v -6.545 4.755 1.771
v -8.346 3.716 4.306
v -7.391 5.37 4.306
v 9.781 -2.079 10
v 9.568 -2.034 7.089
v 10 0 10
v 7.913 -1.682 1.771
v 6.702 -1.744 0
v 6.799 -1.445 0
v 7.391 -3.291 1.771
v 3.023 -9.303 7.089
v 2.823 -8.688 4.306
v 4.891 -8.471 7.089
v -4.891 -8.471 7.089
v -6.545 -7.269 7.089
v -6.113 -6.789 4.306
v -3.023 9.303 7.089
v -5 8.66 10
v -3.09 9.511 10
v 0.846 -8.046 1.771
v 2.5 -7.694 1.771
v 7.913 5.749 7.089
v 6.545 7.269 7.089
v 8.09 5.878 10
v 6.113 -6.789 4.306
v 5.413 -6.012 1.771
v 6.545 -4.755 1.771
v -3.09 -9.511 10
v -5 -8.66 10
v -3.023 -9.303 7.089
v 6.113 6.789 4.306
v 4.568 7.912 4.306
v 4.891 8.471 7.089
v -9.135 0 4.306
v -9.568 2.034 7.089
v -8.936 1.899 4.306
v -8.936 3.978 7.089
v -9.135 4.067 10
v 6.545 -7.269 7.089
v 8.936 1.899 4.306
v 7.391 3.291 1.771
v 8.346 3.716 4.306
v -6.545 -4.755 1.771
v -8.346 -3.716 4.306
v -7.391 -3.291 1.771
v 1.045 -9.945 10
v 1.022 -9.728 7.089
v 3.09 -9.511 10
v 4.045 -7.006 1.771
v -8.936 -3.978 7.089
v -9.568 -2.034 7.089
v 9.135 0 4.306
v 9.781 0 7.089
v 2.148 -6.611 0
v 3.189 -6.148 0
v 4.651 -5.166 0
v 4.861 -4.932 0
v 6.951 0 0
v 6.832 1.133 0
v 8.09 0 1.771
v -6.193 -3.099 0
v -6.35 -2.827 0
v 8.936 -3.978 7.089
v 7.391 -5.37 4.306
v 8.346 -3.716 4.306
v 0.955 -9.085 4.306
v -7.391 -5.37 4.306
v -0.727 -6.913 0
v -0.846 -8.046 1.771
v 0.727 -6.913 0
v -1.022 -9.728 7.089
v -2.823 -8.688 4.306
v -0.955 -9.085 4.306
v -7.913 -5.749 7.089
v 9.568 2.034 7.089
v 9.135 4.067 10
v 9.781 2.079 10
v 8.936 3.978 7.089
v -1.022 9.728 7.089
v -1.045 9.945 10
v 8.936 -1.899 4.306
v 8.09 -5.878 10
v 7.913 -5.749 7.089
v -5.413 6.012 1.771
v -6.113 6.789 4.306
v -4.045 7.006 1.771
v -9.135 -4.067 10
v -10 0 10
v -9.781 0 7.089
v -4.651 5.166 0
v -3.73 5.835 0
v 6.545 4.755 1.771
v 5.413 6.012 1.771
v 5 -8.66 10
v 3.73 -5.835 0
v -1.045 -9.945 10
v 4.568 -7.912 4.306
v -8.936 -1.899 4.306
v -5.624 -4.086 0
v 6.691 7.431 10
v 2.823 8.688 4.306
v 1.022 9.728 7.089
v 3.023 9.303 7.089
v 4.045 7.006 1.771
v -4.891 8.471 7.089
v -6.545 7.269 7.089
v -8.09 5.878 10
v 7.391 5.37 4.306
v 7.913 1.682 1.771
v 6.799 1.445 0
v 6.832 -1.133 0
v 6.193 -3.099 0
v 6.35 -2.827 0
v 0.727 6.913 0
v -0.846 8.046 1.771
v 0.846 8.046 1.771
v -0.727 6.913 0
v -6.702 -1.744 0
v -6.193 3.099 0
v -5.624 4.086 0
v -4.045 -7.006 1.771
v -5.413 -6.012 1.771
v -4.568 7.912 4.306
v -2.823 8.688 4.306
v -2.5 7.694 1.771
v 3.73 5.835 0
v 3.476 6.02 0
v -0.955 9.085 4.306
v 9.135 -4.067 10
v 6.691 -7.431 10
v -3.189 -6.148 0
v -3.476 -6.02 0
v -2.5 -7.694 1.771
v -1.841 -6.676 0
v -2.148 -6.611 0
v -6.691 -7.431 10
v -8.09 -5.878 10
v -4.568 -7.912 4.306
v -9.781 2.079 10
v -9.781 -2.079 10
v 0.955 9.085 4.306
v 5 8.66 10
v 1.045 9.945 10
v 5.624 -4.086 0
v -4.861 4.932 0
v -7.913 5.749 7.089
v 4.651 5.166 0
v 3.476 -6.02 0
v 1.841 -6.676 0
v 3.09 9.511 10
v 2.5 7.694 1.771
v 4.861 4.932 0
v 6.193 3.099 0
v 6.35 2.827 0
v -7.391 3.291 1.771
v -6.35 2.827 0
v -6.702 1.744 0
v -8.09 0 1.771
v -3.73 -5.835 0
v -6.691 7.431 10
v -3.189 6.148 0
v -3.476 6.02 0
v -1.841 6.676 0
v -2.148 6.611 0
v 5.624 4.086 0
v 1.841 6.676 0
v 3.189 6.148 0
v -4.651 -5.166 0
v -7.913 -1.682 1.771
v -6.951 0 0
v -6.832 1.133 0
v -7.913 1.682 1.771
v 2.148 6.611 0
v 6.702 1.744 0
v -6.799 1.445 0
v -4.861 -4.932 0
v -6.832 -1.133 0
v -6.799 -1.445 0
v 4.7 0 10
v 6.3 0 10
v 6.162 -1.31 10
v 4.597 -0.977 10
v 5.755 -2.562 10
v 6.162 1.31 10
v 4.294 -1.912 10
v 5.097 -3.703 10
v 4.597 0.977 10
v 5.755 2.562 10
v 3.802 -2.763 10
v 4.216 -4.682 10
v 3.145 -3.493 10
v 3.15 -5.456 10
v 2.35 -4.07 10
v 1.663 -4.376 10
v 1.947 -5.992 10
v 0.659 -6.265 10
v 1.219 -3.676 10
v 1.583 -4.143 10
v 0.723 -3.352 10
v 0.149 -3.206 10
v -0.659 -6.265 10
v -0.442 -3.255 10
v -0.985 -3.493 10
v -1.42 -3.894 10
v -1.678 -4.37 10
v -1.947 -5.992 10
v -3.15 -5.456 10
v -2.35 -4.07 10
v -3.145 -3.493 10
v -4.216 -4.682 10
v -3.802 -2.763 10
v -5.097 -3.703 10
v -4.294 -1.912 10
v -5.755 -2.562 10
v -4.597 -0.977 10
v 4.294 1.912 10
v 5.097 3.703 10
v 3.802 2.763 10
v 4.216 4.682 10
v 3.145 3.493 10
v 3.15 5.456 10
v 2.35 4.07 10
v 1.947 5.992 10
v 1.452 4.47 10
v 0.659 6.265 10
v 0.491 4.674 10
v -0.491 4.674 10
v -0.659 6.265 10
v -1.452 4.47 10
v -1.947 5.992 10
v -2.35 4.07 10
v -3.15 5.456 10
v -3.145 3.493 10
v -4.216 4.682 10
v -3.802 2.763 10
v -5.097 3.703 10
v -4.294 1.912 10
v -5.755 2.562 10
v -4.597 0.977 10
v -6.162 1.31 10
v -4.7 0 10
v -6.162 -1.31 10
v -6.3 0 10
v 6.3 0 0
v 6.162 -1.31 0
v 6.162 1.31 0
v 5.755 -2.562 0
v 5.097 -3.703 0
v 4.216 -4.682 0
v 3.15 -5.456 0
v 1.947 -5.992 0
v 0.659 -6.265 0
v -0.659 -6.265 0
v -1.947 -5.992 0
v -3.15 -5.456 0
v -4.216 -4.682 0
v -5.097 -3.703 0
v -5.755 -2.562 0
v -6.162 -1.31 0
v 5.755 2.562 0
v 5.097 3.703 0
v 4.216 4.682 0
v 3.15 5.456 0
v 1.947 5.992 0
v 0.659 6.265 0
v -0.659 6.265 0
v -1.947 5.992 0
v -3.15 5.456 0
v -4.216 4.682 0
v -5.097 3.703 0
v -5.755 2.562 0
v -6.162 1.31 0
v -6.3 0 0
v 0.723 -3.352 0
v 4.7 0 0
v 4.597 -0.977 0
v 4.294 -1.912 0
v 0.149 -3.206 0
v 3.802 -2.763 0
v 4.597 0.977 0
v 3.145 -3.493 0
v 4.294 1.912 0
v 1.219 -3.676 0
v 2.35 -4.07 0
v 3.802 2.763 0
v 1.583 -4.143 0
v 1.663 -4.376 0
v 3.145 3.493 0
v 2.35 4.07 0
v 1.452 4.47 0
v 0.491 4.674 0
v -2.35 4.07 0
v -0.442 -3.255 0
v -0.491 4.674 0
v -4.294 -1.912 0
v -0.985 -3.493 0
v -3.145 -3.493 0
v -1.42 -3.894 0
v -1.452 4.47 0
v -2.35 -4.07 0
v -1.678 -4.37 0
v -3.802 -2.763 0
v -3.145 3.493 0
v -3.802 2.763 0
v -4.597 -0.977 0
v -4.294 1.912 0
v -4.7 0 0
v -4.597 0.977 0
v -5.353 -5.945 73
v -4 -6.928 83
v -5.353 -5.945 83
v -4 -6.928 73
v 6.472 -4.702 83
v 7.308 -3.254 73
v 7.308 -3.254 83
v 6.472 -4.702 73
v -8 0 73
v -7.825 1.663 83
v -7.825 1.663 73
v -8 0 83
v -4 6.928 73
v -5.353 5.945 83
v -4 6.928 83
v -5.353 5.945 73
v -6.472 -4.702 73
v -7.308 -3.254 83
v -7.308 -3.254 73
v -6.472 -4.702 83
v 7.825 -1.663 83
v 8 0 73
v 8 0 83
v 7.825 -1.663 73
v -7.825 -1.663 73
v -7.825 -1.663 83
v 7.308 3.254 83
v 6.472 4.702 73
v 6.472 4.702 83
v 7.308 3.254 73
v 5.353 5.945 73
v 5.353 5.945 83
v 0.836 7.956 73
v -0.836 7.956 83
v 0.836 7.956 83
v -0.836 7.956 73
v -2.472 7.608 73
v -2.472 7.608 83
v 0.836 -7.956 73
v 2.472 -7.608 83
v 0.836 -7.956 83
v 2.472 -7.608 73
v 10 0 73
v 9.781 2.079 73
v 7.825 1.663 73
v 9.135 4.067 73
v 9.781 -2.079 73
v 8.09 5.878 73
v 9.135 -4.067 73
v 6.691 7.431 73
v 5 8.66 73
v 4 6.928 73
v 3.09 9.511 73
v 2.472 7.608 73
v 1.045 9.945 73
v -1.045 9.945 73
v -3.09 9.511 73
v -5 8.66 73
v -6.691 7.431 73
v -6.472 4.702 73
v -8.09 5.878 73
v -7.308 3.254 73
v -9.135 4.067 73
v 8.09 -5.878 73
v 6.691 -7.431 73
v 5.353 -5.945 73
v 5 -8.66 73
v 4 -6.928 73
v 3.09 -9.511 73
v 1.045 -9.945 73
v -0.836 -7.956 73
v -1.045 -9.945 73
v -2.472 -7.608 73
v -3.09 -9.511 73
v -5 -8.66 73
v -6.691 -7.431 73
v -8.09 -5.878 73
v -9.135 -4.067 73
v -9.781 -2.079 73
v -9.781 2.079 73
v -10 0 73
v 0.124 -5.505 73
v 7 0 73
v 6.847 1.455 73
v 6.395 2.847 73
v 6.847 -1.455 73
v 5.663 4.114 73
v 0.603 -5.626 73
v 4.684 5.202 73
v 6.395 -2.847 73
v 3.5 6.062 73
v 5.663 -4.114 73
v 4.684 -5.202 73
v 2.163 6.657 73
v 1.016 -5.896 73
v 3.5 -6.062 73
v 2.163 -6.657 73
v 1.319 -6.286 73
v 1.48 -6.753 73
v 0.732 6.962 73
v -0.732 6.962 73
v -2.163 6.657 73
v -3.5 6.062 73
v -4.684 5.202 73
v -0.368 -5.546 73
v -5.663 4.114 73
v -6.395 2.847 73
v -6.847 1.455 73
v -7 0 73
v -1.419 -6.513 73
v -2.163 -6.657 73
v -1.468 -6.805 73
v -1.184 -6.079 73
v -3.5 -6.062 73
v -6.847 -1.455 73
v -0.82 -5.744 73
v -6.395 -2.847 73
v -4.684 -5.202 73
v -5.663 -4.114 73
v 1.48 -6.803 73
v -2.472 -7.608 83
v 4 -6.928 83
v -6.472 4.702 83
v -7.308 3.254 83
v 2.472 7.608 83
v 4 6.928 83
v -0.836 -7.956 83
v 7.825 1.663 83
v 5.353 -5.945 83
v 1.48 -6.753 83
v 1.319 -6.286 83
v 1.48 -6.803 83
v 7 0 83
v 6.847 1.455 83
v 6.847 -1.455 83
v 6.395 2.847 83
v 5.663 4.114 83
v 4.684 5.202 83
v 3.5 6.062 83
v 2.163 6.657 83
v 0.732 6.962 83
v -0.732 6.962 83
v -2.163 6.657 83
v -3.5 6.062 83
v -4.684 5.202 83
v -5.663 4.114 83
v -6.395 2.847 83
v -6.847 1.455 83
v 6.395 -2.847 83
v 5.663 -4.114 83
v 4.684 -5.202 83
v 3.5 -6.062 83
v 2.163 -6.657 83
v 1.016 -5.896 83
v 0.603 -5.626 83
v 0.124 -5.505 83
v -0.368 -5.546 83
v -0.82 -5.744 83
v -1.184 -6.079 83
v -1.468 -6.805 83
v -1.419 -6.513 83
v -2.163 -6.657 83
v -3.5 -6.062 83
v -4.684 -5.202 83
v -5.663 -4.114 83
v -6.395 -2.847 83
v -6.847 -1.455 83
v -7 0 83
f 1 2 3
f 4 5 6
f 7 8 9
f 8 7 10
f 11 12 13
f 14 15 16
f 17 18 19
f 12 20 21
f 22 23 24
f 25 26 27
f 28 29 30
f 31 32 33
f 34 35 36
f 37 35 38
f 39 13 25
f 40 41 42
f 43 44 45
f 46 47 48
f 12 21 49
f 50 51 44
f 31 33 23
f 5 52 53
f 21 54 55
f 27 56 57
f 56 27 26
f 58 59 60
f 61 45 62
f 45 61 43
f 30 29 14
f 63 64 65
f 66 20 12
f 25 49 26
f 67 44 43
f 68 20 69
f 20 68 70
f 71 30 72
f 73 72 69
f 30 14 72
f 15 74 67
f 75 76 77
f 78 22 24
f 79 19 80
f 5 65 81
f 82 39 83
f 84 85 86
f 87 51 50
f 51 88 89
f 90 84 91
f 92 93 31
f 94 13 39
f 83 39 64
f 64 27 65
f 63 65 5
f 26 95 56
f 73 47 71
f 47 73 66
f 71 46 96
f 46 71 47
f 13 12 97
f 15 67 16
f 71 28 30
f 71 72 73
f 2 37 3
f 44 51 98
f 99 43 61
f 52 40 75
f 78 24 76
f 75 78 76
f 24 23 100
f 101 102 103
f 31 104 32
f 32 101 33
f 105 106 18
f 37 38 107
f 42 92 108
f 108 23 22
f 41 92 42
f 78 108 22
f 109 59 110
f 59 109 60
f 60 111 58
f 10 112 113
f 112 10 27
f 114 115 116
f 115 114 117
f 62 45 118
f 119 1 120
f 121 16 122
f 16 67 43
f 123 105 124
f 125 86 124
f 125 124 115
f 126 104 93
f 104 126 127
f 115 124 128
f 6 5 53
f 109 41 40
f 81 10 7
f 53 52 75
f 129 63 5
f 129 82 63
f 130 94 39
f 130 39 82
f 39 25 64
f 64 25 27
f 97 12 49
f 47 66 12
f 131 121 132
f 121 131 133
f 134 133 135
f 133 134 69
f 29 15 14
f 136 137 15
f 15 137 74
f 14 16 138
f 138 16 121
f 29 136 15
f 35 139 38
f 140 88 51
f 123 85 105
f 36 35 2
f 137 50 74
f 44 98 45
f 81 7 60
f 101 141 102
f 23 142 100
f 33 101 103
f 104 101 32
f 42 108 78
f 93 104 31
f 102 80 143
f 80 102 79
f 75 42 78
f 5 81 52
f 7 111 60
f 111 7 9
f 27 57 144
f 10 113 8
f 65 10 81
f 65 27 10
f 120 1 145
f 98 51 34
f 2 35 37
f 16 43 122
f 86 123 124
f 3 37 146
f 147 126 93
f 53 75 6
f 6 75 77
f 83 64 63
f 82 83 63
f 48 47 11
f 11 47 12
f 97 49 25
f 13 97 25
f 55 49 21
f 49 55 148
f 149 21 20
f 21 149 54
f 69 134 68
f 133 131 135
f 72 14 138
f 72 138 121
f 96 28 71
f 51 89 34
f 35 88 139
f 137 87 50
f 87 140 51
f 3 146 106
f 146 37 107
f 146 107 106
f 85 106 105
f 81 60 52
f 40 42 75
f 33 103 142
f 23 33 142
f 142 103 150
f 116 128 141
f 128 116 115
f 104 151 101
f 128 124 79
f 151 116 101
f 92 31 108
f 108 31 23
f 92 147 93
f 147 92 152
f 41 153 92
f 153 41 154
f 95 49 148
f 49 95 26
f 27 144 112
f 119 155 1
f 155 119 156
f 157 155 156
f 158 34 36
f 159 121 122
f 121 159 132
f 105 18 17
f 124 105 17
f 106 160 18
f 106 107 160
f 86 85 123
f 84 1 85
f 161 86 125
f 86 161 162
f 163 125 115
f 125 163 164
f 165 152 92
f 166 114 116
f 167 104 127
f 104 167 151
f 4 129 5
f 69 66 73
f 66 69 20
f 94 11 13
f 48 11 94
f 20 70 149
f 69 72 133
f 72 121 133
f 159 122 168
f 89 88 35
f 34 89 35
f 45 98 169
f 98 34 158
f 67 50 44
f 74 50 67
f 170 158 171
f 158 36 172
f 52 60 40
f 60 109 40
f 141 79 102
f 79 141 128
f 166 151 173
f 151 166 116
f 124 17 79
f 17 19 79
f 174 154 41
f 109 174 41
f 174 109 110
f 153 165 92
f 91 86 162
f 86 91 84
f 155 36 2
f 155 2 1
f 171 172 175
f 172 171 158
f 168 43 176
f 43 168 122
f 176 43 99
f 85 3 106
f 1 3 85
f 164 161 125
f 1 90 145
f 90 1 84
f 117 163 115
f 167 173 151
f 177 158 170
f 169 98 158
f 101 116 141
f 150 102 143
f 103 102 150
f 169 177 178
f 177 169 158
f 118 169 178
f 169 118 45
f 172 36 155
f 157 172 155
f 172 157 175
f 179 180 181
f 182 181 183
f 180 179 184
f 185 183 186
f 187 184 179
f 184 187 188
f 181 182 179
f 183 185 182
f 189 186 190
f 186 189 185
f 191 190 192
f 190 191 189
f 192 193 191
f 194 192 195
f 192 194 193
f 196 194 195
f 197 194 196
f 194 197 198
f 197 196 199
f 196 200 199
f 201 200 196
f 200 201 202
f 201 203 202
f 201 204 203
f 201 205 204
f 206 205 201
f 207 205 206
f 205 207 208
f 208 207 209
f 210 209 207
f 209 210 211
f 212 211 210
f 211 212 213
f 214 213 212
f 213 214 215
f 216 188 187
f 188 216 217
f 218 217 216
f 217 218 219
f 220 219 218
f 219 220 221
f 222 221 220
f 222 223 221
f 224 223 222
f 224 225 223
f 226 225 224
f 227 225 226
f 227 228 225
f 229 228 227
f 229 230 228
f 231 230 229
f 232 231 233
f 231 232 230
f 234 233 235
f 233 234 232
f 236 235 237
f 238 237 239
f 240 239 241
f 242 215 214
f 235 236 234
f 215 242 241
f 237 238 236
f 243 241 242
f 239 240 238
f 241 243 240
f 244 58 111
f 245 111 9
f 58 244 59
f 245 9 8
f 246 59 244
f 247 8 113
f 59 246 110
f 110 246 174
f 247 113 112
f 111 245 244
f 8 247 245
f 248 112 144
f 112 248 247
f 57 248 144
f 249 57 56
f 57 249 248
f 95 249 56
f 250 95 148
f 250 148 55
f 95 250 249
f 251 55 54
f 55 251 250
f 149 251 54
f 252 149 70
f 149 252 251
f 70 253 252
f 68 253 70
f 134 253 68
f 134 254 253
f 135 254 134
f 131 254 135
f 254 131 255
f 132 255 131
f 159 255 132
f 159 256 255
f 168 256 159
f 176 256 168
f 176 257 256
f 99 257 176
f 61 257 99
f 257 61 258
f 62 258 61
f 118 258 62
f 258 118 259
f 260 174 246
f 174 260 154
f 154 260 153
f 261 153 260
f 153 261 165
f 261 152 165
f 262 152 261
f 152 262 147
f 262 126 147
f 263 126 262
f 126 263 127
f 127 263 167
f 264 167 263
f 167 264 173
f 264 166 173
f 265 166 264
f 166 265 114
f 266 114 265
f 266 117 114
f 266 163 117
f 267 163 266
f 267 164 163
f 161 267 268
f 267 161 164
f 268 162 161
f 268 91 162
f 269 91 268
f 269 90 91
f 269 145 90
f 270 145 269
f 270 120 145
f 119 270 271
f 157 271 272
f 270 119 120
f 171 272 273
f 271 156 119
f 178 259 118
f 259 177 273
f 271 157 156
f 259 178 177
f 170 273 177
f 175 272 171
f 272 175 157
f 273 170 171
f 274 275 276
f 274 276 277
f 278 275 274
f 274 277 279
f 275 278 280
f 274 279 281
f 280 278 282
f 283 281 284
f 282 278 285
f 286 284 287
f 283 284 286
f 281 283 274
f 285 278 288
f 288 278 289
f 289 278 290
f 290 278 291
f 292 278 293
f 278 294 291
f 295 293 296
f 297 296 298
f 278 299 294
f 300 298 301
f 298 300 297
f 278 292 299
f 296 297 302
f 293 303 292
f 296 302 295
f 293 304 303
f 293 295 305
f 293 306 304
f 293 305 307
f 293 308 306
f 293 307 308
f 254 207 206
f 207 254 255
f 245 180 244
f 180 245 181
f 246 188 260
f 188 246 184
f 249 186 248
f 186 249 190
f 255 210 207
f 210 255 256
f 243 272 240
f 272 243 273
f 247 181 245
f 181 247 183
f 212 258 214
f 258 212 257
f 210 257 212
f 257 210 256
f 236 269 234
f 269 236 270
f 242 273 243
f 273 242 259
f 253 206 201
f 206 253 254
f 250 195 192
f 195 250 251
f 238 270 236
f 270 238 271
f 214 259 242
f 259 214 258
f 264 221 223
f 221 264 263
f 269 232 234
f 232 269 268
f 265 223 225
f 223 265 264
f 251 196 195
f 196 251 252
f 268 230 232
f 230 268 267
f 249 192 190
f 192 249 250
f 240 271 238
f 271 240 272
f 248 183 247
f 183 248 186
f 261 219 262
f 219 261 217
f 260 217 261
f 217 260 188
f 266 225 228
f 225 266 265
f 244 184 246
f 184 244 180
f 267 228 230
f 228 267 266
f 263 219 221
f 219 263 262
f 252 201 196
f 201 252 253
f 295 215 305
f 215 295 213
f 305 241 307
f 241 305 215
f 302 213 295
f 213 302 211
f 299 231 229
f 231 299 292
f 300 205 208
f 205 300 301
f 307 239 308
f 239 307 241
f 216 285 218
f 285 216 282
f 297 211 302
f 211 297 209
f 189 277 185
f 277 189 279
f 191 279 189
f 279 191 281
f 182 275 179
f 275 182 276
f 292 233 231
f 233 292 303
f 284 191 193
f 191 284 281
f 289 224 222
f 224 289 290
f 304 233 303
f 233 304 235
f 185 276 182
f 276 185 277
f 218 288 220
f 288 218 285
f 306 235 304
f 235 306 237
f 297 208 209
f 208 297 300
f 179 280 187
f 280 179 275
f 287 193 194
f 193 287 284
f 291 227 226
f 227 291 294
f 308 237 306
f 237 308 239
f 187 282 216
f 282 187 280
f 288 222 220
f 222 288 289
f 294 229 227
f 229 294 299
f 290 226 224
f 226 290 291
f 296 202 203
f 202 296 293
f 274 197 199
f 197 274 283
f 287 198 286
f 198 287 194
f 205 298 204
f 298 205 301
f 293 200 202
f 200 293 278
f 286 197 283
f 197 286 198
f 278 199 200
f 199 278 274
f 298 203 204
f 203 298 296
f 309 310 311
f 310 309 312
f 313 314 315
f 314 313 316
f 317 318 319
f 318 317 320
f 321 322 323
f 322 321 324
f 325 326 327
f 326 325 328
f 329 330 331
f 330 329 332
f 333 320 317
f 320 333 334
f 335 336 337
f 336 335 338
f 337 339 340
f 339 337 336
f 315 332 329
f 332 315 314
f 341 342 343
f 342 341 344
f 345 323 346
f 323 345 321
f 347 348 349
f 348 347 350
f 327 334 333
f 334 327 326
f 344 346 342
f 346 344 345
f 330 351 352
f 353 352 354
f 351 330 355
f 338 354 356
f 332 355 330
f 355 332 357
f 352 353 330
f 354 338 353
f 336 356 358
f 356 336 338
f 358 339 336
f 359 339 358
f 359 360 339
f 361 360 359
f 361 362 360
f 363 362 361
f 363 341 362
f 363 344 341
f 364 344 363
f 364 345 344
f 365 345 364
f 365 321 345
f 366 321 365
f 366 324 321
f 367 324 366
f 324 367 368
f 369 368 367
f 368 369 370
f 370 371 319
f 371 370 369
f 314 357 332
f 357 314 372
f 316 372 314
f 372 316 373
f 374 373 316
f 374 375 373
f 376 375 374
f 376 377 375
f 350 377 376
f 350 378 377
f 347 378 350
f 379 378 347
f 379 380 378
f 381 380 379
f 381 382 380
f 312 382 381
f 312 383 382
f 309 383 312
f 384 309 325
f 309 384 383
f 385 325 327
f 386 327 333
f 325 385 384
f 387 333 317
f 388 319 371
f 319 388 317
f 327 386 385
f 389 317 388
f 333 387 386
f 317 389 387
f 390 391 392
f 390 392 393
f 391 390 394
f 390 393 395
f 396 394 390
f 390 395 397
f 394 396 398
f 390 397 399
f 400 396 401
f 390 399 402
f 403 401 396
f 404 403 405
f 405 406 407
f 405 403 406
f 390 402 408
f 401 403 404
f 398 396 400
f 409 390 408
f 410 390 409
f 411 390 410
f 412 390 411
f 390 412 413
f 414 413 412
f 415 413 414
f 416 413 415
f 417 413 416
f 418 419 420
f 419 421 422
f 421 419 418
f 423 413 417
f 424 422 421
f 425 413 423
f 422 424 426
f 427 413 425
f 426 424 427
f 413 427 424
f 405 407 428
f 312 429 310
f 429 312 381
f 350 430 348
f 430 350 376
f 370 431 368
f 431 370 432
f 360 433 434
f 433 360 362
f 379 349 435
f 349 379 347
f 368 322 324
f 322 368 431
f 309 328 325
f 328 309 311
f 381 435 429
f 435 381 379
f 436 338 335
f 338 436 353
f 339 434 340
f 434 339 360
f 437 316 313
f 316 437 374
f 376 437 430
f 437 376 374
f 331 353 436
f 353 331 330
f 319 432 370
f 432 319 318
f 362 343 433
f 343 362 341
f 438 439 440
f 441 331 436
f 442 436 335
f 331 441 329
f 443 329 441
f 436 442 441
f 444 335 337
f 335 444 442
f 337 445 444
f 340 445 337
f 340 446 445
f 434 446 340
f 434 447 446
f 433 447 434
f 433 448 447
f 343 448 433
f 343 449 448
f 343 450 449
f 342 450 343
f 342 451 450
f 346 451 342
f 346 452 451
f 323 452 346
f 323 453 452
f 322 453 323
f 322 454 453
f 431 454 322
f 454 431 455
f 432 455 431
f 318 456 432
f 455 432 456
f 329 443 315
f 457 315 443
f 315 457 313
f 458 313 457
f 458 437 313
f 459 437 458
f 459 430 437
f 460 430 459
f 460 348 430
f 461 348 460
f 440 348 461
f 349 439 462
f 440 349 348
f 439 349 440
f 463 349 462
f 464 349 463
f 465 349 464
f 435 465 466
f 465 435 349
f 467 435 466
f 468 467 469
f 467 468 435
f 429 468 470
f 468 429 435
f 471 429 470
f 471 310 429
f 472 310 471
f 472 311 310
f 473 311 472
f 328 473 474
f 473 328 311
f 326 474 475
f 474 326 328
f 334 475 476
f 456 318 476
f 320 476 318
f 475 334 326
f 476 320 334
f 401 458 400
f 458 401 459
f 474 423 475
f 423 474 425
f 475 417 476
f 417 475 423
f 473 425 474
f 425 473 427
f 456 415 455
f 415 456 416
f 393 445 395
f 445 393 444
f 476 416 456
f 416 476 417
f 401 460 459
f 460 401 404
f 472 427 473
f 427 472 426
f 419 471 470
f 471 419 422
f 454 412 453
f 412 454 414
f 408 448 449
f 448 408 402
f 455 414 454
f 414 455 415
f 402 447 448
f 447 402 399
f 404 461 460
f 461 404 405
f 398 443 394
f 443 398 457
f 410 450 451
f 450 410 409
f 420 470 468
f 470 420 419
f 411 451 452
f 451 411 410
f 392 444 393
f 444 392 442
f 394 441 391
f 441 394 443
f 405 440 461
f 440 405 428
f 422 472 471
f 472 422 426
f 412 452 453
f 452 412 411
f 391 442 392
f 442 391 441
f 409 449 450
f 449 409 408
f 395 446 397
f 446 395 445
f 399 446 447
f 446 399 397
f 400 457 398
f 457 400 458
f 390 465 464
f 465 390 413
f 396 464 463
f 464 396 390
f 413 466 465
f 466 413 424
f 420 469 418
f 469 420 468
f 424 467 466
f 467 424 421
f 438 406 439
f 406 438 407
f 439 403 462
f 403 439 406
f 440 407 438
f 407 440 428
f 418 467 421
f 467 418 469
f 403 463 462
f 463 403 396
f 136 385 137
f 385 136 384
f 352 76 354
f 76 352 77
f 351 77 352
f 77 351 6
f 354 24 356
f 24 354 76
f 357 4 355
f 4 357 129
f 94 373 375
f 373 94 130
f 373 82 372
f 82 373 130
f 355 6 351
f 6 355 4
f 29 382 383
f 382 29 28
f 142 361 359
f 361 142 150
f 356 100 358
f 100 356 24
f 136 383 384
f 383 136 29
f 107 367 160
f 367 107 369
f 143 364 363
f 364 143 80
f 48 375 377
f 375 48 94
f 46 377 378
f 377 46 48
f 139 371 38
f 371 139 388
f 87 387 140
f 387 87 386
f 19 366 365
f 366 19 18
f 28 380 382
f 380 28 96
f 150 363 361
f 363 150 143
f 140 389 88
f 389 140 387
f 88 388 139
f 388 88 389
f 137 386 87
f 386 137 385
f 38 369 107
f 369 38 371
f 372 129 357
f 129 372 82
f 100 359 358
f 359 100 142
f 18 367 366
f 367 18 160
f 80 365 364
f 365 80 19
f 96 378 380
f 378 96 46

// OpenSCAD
// file: ../../connectors/notched_circle/constants.scad
connectors_notched_circle_thickness = 2;
connectors_notched_circle_notch_diameter = 3;
connectors_notched_circle_loose_length = 1;
connectors_notched_circle_loose_to_tight_length = 1;
// file: ../feed/measurements.scad
hero_dualie_feed_connector_depth = 5;
hero_dualie_feed_diameter = 5;
hero_dualie_feed_x = 59;
hero_dualie_feed_y = 45;
hero_dualie_feed_angle = 20;
// file: ../../connectors/notched_circle/female.scad
include <../../settings.scad>;
use <../../utilities/cylinders.scad>;
include <constants.scad>;

// Renders the female counterpart of a circular connector with an orienting
// notch.  Place on the surface oriented so that Z- is the surface normal.
module connectors_notched_circle_female(
    // The outer diameter of the compatible male circle.
    diameter,
    // The length of the male compatible circle.
    length
) {
  union() {
    difference() {
      cylinder(
        d = diameter + tight_tolerance,
        h = length + tight_tolerance,
        $fn = cylinder_sides(diameter)
      );
      cylinder(
        d = diameter - connectors_notched_circle_thickness - tight_tolerance,
        h = length + tight_tolerance,
        $fn = cylinder_sides(diameter)
      );
    };
    intersection() {
      translate([
        0,
        diameter / 2 - connectors_notched_circle_thickness / 2,
        0
      ]) {
        cylinder(
          d = connectors_notched_circle_notch_diameter + tight_tolerance,
          h = length + tight_tolerance,
          $fn = cylinder_sides(connectors_notched_circle_notch_diameter)
        );
      };
      cylinder(
        d = diameter + tight_tolerance,
        h = length + tight_tolerance,
        $fn = cylinder_sides(diameter)
      );
    };
  };
};

difference() {
  cube([10, 10, 7]);

  translate([5, 5, 7.001]) {
    rotate([180, 0, 0]) {
      connectors_notched_circle_female(6, 5);
    }
  };
};
// file: ../../connectors/notched_circle/male.scad
include <../../settings.scad>;
use <../../utilities/cylinders.scad>;
include <constants.scad>;

// Renders the male counterpart of a circular connector with an orienting notch.
// Place on the surface oriented so that Z+ is the surface normal.
module connectors_notched_circle_male(
    // The outer diameter of the male circle.
    diameter,
    // The length of the male circle.
    length
) {
  union() {
    difference() {
      cylinder(
        d = diameter,
        h = length,
        $fn = cylinder_sides(diameter)
      );
      cylinder(
        d = diameter - connectors_notched_circle_thickness,
        h = length,
        $fn = cylinder_sides(diameter)
      );
    };
    intersection() {
      translate([
        0,
        diameter / 2 - connectors_notched_circle_thickness / 2,
        0
      ]) {
        cylinder(
          d = connectors_notched_circle_notch_diameter,
          h = length,
          $fn = cylinder_sides(connectors_notched_circle_notch_diameter)
        );
      };
      cylinder(
        d = diameter,
        h = length,
        $fn = cylinder_sides(diameter)
      );
    };
  };
};
// file: ../../components/nut.scad
use <../utilities/cylinders.scad>

// Generates a nut exterior along Z+, including rounded vertices.
module components_nut(
  // The diameter of the nut, measures between opposing vertices.
  vertex_diameter,
  // The length of the nut along Z+.
  length,
  // The number of sides on the nut.
  sides,
  // The radiusing to apply horizontally.
  horizontal_radiusing,
  // The radiusing to apply vertically.
  vertical_radiusing
) {
  intersection() {
    cylinder(
      d = vertex_diameter,
      h = length,
      $fn = sides
    );
    translate([0, 0, length / 2]) {
      scale([
        vertex_diameter * horizontal_radiusing,
        vertex_diameter * horizontal_radiusing,
        length * vertical_radiusing
      ]) {
        sphere(1, $fn = cylinder_sides(norm([vertex_diameter, length]) * 2));
      };
    };
  };
};
// file: ../../utilities/cylinders.scad
// Calculates the $fn which should be used for a cylinder of a specific size.
function cylinder_sides(
  // The diameter of the cylinder.
  diameter
) = ceil(
  max(
    min(
      360 / $fa,
      diameter * PI / $fs
    ),
    8
  )
);

// Generates a grid of square perforations through a cylinder of a specific
// size.
module cylinder_perforations(
  // The diameter of the cylinder.
  diameter,
  // The height of the cylinder.
  length,
  // The size (width/height) of each perforation.
  perforation_size,
  // The target spacing between perforations.  This will be adjusted to fit
  // evenly on the cylinder.
  perforation_spacing
) {
  half_perimeter = diameter * PI / 2;
  angularPerforations = round(half_perimeter / perforation_spacing);
  zPerforations = round(length / perforation_spacing);
  for (angle = [0:180 / angularPerforations:180]) {
    rotate([0, 0, angle]) {
      for (z = [(length / zPerforations) * 0.5:length / zPerforations:length - (length / zPerforations) * 0.5]) {
        translate([0, 0, z]) {
          cube([diameter, perforation_size, perforation_size], center = true);
        };
      }
    };
  };
};

// Generates a "pipe" which lofts a sequence of circles together.
module cylinder_sequence(
  // The diameter of the first circle.
  initial_diameter,
  // An array of arrays, where each child array is two numbers:
  // - The length of the segment along Z.
  // - The diameter of the end of the segment.
  length_diameter_pairs,
  // The number of sides of all circles drawn.
  sides,
  // Used for recursion; leave as default.
  i = 0
) {
  if (i < len(length_diameter_pairs)) {
    cylinder(
      d1 = initial_diameter,
      d2 = length_diameter_pairs[i][1],
      h = length_diameter_pairs[i][0],
      $fn = sides
    );
    translate([
      0,
      0,
      length_diameter_pairs[i][0]
    ]) {
      cylinder_sequence(
        length_diameter_pairs[i][1],
        length_diameter_pairs,
        sides,
        i + 1
      );
    };
  };
};
// file: main.scad
include <../../settings.scad>;
use <../../utilities/cylinders.scad>;
use <../../components/nut.scad>;
use <../../connectors/notched_circle/male.scad>;
use <../../connectors/notched_circle/female.scad>;
include <measurements.scad>;
include <../feed/measurements.scad>;

module hero_dualie_tube_main() {
  difference() {
    // The "funnel" to the feed.
    intersection() {
      translate([
        0,
        0,
        hero_dualie_tube_main_funnel_truncate
      ]) {
        scale([
          1,
          1,
          hero_dualie_tube_main_funnel_length / hero_dualie_tube_main_diameter
        ]) {
          sphere(
            d = hero_dualie_tube_main_diameter,
            $fn = cylinder_sides(hero_dualie_tube_main_diameter)
          );
        };
      };
      translate([
        hero_dualie_tube_main_diameter / -2,
        hero_dualie_tube_main_diameter / -2,
        0
      ]) {
        cube([
          hero_dualie_tube_main_diameter,
          hero_dualie_tube_main_diameter,
          hero_dualie_tube_main_funnel_truncate
        ]);
      };
    };

    // The connector to the feed.
    rotate([0, 0, 180]) {
      connectors_notched_circle_female(
        hero_dualie_tube_nut_connector_diameter,
        hero_dualie_tube_nut_connector_length,
        hero_dualie_tube_nut_connector_notches
      );
    };
  };

  // The main body of the tube.
  translate([
    0,
    0,
    hero_dualie_tube_main_funnel_truncate
  ]) {
    cylinder(
      d = hero_dualie_tube_main_diameter,
      h = hero_dualie_tube_main_length,
      $fn = cylinder_sides(hero_dualie_tube_main_diameter)
    );
  };

  // The connector to the hopper nut.
  translate([
    0,
    0,
    hero_dualie_tube_main_funnel_truncate + hero_dualie_tube_main_length
  ]) {
    rotate([0, 0, 180]) {
      connectors_notched_circle_male(
        hero_dualie_tube_hopper_connector_diameter,
        hero_dualie_tube_hopper_connector_length,
        hero_dualie_tube_hopper_connector_notches
      );
    };
  };
};
// file: measurements.scad
hero_dualie_tube_nut_length = 9;
hero_dualie_tube_nut_diameter = 18;
hero_dualie_tube_nut_sides = 6;
hero_dualie_tube_nut_horizontal_radiusing = 0.52;
hero_dualie_tube_nut_vertical_radiusing = 1;

hero_dualie_tube_nut_connector_diameter = 12;
hero_dualie_tube_nut_connector_length = 10;
hero_dualie_tube_nut_connector_notches = 3;

hero_dualie_tube_main_length = 63;
hero_dualie_tube_main_diameter = 20;
hero_dualie_tube_main_funnel_length = 28;
hero_dualie_tube_main_funnel_truncate = 10;

hero_dualie_tube_hopper_connector_diameter = 16;
hero_dualie_tube_hopper_connector_length = 10;
hero_dualie_tube_hopper_connector_notches = 3;
// file: ../../settings.scad
// When true, lower resolution primitives will be used.
draft = false;

$fs = draft ? 1 : 0.5;

// The amount of space left between parts which must fit together tightly.
tight_tolerance = 0.6;

// The amount of space left between parts which must fit together loosely.
loose_tolerance = 1;

// Calculates the $fn which should be used for a cylinder of a specific size.
function cylinder_sides(
  // The diameter of the cylinder.
  diameter
) = ceil(
  max(
    min(
      360 / $fa,
      diameter * PI / $fs
    ),
    8
  )
);
// main file
include <../../settings.scad>;
include <measurements.scad>;
use <main.scad>;

hero_dualie_tube_main();
